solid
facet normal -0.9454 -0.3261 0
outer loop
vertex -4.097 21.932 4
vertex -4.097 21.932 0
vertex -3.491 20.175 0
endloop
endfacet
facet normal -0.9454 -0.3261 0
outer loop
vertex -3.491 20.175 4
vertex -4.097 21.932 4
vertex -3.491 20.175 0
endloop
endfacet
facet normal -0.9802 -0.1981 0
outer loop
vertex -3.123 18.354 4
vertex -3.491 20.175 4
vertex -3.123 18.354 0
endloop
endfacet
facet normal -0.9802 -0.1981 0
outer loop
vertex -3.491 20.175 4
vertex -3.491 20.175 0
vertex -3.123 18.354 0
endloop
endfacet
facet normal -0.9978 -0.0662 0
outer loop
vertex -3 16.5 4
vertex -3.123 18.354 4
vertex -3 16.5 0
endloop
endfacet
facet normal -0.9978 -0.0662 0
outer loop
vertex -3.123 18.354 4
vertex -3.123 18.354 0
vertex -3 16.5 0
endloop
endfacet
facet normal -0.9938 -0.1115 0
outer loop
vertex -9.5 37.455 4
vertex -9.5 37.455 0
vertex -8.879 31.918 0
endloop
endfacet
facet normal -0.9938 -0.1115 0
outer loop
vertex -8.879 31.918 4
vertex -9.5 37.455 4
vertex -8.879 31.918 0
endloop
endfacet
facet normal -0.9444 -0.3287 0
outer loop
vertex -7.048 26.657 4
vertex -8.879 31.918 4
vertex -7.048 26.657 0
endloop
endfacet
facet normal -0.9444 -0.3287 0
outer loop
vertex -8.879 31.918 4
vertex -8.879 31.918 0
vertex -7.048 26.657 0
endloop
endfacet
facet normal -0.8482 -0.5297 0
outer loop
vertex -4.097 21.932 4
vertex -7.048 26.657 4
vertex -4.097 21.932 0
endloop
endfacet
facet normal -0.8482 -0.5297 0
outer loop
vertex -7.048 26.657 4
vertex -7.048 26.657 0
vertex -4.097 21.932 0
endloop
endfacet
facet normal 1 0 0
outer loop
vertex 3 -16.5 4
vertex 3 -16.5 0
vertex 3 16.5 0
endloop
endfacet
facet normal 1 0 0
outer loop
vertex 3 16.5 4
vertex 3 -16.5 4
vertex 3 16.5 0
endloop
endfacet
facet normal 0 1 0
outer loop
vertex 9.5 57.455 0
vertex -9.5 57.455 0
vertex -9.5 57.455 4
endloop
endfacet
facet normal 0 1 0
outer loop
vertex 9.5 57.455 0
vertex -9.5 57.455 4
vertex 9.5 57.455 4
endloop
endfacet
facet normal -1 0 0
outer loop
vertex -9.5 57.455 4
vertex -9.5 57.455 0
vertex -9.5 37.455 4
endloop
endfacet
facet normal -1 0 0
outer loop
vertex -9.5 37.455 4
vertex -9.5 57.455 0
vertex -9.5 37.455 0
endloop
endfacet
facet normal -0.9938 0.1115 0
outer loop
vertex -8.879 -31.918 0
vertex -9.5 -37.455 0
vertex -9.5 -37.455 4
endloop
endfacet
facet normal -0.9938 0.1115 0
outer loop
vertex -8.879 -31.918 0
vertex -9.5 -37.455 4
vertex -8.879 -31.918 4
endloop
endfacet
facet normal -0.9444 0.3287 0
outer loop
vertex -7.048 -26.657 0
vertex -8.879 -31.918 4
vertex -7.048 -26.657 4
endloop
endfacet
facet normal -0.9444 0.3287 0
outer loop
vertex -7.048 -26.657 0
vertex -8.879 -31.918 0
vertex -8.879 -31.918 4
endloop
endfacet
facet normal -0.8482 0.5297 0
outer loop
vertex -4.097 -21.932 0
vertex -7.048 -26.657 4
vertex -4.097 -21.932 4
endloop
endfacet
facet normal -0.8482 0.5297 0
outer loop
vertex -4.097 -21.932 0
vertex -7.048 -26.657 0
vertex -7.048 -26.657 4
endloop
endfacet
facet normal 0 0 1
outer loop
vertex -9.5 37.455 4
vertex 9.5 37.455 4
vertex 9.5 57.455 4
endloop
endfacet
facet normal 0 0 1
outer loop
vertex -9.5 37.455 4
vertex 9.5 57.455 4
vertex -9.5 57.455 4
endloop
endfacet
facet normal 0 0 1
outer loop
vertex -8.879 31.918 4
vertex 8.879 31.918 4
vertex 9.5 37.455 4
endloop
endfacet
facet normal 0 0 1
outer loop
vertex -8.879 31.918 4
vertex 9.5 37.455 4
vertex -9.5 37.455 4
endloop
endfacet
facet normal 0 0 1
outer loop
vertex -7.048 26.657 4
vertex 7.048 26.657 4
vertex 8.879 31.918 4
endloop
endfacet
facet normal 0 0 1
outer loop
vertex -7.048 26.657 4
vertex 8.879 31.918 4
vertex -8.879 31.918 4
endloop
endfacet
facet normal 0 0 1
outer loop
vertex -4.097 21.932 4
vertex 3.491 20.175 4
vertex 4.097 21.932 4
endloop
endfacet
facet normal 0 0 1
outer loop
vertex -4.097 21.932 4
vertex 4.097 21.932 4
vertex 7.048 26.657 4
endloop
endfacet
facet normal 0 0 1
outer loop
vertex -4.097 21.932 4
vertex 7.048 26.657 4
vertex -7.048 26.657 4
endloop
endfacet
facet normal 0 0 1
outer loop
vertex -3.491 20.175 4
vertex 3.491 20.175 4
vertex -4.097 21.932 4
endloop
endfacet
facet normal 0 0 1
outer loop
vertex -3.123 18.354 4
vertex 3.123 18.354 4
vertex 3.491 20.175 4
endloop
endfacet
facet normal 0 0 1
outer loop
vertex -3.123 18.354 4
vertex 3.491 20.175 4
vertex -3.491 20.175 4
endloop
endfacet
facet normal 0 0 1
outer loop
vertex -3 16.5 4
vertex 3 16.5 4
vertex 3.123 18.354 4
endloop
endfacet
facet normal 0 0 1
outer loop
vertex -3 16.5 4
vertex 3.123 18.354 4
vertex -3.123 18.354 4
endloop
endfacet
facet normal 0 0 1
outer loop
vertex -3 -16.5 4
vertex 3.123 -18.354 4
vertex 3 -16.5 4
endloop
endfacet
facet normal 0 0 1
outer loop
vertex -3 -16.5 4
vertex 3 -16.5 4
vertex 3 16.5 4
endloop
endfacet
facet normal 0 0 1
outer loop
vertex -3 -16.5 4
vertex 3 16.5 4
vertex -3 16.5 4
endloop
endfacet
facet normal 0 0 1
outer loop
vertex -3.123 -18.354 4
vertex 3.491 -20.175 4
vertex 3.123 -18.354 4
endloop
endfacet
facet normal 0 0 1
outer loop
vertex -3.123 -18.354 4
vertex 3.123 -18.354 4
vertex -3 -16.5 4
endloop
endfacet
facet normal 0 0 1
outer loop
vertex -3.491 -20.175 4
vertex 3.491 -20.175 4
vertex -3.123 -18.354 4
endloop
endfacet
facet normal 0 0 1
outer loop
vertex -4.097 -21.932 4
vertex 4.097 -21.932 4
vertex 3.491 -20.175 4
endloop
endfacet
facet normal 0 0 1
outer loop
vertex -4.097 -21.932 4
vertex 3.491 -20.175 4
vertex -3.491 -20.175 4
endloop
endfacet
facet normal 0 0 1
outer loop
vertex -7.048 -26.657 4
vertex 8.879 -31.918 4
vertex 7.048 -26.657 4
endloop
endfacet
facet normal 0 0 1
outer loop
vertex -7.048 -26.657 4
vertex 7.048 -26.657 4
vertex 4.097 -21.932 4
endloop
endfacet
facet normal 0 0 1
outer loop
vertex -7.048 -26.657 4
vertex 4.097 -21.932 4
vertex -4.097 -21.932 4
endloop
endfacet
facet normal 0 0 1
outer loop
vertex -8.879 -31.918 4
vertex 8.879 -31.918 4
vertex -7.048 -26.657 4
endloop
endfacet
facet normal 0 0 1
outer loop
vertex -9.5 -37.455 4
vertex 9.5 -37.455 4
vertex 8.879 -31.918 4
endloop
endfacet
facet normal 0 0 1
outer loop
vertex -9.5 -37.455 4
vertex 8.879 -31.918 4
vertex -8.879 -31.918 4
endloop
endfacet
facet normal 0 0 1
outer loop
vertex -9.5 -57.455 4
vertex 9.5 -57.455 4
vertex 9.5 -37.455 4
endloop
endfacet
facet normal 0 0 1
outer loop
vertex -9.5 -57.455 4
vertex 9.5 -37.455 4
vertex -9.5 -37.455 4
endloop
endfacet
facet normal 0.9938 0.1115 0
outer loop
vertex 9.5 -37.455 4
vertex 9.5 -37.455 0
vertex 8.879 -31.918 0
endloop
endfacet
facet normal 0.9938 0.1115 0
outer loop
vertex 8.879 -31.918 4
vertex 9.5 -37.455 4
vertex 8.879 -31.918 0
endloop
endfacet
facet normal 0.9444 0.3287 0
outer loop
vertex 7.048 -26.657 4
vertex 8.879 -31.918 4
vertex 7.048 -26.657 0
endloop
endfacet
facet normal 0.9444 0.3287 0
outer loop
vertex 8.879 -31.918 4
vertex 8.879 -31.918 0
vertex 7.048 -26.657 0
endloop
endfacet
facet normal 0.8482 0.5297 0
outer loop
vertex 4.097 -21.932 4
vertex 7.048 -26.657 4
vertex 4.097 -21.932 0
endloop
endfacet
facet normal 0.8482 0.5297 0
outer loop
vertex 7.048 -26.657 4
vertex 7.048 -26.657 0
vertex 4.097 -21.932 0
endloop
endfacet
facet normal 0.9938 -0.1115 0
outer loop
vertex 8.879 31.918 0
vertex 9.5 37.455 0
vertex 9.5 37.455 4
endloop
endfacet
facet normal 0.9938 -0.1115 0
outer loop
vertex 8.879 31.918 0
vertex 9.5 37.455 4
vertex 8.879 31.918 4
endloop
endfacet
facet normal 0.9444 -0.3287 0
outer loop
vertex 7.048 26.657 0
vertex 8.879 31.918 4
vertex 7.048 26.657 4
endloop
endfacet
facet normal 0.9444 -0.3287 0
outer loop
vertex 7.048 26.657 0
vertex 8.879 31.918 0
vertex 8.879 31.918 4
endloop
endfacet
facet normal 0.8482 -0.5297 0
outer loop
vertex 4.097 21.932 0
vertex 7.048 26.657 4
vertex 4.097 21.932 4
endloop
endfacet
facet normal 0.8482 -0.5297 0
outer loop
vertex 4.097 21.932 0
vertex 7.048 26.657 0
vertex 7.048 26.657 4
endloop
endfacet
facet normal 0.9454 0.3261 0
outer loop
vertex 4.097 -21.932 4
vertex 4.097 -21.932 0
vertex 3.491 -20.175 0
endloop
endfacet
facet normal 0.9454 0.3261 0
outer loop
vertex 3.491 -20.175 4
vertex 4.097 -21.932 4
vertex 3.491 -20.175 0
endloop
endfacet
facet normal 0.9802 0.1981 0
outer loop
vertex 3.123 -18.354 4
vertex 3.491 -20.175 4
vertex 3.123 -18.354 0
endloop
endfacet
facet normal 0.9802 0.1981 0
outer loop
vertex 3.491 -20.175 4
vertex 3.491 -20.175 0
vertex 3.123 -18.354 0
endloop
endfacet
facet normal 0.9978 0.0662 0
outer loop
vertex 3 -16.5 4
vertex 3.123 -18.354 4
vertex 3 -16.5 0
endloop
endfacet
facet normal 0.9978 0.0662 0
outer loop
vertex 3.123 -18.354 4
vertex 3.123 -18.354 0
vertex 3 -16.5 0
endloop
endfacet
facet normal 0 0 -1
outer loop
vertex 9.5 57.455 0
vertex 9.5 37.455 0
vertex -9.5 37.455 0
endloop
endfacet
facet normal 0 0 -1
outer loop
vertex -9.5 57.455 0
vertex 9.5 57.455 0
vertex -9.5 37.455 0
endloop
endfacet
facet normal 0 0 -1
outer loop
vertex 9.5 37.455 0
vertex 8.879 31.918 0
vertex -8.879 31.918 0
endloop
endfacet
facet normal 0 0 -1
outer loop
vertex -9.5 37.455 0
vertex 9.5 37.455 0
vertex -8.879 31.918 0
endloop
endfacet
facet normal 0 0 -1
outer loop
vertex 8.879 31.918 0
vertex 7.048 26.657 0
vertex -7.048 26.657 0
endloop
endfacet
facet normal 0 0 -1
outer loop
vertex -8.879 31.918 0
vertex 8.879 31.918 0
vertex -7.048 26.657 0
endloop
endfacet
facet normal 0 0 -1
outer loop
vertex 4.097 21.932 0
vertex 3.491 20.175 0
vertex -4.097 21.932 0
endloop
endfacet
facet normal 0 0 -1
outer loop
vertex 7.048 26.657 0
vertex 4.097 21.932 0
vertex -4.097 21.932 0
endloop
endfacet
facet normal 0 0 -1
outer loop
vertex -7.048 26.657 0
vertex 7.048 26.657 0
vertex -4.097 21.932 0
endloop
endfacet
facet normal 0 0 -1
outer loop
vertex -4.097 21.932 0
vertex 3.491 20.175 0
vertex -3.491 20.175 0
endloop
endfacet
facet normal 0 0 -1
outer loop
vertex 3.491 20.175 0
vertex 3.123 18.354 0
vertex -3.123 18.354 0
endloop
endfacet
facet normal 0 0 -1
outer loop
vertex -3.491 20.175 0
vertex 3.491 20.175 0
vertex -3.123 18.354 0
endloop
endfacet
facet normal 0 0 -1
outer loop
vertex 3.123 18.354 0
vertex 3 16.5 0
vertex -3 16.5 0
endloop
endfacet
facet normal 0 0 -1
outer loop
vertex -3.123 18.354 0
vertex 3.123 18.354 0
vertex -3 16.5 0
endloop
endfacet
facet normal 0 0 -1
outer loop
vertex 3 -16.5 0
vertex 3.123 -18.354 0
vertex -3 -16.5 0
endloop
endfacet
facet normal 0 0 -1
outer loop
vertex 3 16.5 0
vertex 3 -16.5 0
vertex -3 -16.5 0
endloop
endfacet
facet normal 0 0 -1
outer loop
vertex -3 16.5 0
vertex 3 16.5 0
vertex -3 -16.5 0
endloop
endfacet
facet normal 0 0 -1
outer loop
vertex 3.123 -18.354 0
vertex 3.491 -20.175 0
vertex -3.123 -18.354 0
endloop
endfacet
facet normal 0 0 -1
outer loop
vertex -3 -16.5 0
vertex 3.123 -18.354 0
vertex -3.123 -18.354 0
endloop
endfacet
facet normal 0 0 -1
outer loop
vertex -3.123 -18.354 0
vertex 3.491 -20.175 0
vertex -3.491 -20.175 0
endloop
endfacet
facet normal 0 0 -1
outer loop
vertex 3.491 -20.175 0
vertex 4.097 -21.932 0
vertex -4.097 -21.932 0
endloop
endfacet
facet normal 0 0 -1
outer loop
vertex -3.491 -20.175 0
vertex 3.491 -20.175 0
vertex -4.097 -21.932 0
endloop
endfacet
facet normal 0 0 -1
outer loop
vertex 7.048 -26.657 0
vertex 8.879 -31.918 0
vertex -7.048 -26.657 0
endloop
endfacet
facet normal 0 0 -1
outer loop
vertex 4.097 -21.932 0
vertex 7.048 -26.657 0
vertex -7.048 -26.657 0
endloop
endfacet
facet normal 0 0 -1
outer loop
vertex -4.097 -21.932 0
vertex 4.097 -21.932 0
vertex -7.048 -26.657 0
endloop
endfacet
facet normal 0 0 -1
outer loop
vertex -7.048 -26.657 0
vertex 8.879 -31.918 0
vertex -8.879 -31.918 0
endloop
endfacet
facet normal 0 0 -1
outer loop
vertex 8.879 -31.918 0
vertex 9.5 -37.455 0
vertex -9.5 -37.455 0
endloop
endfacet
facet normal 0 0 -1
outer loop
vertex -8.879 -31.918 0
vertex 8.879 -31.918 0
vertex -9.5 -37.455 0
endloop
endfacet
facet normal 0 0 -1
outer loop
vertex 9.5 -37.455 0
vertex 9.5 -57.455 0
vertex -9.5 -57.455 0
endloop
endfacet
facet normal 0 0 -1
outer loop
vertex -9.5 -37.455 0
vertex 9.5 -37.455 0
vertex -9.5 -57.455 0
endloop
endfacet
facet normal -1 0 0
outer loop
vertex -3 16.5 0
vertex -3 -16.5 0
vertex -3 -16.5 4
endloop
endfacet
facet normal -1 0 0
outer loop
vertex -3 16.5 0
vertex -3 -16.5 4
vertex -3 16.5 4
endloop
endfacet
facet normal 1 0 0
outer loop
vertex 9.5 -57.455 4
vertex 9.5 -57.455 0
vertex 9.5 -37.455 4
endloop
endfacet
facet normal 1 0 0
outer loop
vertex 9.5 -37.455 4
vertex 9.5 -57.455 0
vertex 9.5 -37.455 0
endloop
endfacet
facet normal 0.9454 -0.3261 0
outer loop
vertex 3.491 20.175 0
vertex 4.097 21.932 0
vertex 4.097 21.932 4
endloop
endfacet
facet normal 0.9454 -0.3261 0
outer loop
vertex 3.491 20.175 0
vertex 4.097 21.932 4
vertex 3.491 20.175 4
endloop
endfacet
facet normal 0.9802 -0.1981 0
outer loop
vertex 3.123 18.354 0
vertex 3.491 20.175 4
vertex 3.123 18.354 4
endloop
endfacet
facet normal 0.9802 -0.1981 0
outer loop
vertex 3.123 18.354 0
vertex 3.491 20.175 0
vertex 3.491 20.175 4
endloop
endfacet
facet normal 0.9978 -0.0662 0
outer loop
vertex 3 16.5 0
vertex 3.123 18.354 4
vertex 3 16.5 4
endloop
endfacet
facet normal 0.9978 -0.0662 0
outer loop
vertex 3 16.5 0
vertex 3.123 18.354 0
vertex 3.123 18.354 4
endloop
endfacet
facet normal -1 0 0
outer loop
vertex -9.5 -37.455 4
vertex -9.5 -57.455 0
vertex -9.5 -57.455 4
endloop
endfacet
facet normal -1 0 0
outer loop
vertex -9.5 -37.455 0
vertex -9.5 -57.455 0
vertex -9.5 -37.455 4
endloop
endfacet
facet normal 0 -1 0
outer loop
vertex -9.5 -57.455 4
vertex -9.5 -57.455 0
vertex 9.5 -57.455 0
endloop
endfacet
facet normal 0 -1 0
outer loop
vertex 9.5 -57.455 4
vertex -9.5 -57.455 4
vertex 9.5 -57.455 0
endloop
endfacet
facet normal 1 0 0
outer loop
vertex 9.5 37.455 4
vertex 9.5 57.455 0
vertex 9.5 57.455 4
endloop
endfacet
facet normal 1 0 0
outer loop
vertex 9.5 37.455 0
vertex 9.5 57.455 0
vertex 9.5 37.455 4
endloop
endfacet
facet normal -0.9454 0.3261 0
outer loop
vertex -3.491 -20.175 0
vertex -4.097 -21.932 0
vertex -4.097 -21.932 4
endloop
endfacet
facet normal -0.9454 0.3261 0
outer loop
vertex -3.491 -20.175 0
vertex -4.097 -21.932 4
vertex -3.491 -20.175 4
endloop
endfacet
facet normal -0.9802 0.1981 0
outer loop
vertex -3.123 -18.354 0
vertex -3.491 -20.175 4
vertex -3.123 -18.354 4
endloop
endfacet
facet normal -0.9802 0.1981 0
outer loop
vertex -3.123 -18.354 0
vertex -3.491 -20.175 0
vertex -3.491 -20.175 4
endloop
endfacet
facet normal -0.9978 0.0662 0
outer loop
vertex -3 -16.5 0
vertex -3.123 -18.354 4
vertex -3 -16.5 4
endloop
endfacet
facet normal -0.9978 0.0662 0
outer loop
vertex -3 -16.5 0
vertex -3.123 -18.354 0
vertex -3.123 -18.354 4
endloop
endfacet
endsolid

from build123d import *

# Parameters (mm, degrees)
F1_DEPTH = 4


with BuildPart() as f1:
    # F0 (on Top) → F1 (new body)
    with BuildSketch(Plane.XY):
        with BuildLine():
            Line((-9.5, 57.454867), (-9.5, 37.454867))
            ThreePointArc((-9.5, 37.454867), (-8.110527, 29.236411), (-4.096559, 21.931501))
            ThreePointArc((-4.096559, 21.931501), (-3.276878, 19.270544), (-3, 16.5))
            Line((-3, 16.5), (-3, 0))
            Line((-3, 0), (0, 0))
            Line((0, 0), (0, 57.454867))
            Line((0, 57.454867), (-9.5, 57.454867))
        make_face()
    extrude(amount=F1_DEPTH)

    # F2: F1 across face


with BuildPart() as f1_1:
    add(f1.part)
    add(f1.part.mirror(Plane(origin=(-1.5, 0, 2), x_dir=(1, 0, 0), z_dir=(0, -1, 0))))

    # F3: F1 across face


with BuildPart() as f1_2:
    add(f1_1.part)
    add(f1_1.part.mirror(Plane(origin=(0, 0, 2), x_dir=(0, 1, 0), z_dir=(1, 0, 0))))


solid = f1_2.part
